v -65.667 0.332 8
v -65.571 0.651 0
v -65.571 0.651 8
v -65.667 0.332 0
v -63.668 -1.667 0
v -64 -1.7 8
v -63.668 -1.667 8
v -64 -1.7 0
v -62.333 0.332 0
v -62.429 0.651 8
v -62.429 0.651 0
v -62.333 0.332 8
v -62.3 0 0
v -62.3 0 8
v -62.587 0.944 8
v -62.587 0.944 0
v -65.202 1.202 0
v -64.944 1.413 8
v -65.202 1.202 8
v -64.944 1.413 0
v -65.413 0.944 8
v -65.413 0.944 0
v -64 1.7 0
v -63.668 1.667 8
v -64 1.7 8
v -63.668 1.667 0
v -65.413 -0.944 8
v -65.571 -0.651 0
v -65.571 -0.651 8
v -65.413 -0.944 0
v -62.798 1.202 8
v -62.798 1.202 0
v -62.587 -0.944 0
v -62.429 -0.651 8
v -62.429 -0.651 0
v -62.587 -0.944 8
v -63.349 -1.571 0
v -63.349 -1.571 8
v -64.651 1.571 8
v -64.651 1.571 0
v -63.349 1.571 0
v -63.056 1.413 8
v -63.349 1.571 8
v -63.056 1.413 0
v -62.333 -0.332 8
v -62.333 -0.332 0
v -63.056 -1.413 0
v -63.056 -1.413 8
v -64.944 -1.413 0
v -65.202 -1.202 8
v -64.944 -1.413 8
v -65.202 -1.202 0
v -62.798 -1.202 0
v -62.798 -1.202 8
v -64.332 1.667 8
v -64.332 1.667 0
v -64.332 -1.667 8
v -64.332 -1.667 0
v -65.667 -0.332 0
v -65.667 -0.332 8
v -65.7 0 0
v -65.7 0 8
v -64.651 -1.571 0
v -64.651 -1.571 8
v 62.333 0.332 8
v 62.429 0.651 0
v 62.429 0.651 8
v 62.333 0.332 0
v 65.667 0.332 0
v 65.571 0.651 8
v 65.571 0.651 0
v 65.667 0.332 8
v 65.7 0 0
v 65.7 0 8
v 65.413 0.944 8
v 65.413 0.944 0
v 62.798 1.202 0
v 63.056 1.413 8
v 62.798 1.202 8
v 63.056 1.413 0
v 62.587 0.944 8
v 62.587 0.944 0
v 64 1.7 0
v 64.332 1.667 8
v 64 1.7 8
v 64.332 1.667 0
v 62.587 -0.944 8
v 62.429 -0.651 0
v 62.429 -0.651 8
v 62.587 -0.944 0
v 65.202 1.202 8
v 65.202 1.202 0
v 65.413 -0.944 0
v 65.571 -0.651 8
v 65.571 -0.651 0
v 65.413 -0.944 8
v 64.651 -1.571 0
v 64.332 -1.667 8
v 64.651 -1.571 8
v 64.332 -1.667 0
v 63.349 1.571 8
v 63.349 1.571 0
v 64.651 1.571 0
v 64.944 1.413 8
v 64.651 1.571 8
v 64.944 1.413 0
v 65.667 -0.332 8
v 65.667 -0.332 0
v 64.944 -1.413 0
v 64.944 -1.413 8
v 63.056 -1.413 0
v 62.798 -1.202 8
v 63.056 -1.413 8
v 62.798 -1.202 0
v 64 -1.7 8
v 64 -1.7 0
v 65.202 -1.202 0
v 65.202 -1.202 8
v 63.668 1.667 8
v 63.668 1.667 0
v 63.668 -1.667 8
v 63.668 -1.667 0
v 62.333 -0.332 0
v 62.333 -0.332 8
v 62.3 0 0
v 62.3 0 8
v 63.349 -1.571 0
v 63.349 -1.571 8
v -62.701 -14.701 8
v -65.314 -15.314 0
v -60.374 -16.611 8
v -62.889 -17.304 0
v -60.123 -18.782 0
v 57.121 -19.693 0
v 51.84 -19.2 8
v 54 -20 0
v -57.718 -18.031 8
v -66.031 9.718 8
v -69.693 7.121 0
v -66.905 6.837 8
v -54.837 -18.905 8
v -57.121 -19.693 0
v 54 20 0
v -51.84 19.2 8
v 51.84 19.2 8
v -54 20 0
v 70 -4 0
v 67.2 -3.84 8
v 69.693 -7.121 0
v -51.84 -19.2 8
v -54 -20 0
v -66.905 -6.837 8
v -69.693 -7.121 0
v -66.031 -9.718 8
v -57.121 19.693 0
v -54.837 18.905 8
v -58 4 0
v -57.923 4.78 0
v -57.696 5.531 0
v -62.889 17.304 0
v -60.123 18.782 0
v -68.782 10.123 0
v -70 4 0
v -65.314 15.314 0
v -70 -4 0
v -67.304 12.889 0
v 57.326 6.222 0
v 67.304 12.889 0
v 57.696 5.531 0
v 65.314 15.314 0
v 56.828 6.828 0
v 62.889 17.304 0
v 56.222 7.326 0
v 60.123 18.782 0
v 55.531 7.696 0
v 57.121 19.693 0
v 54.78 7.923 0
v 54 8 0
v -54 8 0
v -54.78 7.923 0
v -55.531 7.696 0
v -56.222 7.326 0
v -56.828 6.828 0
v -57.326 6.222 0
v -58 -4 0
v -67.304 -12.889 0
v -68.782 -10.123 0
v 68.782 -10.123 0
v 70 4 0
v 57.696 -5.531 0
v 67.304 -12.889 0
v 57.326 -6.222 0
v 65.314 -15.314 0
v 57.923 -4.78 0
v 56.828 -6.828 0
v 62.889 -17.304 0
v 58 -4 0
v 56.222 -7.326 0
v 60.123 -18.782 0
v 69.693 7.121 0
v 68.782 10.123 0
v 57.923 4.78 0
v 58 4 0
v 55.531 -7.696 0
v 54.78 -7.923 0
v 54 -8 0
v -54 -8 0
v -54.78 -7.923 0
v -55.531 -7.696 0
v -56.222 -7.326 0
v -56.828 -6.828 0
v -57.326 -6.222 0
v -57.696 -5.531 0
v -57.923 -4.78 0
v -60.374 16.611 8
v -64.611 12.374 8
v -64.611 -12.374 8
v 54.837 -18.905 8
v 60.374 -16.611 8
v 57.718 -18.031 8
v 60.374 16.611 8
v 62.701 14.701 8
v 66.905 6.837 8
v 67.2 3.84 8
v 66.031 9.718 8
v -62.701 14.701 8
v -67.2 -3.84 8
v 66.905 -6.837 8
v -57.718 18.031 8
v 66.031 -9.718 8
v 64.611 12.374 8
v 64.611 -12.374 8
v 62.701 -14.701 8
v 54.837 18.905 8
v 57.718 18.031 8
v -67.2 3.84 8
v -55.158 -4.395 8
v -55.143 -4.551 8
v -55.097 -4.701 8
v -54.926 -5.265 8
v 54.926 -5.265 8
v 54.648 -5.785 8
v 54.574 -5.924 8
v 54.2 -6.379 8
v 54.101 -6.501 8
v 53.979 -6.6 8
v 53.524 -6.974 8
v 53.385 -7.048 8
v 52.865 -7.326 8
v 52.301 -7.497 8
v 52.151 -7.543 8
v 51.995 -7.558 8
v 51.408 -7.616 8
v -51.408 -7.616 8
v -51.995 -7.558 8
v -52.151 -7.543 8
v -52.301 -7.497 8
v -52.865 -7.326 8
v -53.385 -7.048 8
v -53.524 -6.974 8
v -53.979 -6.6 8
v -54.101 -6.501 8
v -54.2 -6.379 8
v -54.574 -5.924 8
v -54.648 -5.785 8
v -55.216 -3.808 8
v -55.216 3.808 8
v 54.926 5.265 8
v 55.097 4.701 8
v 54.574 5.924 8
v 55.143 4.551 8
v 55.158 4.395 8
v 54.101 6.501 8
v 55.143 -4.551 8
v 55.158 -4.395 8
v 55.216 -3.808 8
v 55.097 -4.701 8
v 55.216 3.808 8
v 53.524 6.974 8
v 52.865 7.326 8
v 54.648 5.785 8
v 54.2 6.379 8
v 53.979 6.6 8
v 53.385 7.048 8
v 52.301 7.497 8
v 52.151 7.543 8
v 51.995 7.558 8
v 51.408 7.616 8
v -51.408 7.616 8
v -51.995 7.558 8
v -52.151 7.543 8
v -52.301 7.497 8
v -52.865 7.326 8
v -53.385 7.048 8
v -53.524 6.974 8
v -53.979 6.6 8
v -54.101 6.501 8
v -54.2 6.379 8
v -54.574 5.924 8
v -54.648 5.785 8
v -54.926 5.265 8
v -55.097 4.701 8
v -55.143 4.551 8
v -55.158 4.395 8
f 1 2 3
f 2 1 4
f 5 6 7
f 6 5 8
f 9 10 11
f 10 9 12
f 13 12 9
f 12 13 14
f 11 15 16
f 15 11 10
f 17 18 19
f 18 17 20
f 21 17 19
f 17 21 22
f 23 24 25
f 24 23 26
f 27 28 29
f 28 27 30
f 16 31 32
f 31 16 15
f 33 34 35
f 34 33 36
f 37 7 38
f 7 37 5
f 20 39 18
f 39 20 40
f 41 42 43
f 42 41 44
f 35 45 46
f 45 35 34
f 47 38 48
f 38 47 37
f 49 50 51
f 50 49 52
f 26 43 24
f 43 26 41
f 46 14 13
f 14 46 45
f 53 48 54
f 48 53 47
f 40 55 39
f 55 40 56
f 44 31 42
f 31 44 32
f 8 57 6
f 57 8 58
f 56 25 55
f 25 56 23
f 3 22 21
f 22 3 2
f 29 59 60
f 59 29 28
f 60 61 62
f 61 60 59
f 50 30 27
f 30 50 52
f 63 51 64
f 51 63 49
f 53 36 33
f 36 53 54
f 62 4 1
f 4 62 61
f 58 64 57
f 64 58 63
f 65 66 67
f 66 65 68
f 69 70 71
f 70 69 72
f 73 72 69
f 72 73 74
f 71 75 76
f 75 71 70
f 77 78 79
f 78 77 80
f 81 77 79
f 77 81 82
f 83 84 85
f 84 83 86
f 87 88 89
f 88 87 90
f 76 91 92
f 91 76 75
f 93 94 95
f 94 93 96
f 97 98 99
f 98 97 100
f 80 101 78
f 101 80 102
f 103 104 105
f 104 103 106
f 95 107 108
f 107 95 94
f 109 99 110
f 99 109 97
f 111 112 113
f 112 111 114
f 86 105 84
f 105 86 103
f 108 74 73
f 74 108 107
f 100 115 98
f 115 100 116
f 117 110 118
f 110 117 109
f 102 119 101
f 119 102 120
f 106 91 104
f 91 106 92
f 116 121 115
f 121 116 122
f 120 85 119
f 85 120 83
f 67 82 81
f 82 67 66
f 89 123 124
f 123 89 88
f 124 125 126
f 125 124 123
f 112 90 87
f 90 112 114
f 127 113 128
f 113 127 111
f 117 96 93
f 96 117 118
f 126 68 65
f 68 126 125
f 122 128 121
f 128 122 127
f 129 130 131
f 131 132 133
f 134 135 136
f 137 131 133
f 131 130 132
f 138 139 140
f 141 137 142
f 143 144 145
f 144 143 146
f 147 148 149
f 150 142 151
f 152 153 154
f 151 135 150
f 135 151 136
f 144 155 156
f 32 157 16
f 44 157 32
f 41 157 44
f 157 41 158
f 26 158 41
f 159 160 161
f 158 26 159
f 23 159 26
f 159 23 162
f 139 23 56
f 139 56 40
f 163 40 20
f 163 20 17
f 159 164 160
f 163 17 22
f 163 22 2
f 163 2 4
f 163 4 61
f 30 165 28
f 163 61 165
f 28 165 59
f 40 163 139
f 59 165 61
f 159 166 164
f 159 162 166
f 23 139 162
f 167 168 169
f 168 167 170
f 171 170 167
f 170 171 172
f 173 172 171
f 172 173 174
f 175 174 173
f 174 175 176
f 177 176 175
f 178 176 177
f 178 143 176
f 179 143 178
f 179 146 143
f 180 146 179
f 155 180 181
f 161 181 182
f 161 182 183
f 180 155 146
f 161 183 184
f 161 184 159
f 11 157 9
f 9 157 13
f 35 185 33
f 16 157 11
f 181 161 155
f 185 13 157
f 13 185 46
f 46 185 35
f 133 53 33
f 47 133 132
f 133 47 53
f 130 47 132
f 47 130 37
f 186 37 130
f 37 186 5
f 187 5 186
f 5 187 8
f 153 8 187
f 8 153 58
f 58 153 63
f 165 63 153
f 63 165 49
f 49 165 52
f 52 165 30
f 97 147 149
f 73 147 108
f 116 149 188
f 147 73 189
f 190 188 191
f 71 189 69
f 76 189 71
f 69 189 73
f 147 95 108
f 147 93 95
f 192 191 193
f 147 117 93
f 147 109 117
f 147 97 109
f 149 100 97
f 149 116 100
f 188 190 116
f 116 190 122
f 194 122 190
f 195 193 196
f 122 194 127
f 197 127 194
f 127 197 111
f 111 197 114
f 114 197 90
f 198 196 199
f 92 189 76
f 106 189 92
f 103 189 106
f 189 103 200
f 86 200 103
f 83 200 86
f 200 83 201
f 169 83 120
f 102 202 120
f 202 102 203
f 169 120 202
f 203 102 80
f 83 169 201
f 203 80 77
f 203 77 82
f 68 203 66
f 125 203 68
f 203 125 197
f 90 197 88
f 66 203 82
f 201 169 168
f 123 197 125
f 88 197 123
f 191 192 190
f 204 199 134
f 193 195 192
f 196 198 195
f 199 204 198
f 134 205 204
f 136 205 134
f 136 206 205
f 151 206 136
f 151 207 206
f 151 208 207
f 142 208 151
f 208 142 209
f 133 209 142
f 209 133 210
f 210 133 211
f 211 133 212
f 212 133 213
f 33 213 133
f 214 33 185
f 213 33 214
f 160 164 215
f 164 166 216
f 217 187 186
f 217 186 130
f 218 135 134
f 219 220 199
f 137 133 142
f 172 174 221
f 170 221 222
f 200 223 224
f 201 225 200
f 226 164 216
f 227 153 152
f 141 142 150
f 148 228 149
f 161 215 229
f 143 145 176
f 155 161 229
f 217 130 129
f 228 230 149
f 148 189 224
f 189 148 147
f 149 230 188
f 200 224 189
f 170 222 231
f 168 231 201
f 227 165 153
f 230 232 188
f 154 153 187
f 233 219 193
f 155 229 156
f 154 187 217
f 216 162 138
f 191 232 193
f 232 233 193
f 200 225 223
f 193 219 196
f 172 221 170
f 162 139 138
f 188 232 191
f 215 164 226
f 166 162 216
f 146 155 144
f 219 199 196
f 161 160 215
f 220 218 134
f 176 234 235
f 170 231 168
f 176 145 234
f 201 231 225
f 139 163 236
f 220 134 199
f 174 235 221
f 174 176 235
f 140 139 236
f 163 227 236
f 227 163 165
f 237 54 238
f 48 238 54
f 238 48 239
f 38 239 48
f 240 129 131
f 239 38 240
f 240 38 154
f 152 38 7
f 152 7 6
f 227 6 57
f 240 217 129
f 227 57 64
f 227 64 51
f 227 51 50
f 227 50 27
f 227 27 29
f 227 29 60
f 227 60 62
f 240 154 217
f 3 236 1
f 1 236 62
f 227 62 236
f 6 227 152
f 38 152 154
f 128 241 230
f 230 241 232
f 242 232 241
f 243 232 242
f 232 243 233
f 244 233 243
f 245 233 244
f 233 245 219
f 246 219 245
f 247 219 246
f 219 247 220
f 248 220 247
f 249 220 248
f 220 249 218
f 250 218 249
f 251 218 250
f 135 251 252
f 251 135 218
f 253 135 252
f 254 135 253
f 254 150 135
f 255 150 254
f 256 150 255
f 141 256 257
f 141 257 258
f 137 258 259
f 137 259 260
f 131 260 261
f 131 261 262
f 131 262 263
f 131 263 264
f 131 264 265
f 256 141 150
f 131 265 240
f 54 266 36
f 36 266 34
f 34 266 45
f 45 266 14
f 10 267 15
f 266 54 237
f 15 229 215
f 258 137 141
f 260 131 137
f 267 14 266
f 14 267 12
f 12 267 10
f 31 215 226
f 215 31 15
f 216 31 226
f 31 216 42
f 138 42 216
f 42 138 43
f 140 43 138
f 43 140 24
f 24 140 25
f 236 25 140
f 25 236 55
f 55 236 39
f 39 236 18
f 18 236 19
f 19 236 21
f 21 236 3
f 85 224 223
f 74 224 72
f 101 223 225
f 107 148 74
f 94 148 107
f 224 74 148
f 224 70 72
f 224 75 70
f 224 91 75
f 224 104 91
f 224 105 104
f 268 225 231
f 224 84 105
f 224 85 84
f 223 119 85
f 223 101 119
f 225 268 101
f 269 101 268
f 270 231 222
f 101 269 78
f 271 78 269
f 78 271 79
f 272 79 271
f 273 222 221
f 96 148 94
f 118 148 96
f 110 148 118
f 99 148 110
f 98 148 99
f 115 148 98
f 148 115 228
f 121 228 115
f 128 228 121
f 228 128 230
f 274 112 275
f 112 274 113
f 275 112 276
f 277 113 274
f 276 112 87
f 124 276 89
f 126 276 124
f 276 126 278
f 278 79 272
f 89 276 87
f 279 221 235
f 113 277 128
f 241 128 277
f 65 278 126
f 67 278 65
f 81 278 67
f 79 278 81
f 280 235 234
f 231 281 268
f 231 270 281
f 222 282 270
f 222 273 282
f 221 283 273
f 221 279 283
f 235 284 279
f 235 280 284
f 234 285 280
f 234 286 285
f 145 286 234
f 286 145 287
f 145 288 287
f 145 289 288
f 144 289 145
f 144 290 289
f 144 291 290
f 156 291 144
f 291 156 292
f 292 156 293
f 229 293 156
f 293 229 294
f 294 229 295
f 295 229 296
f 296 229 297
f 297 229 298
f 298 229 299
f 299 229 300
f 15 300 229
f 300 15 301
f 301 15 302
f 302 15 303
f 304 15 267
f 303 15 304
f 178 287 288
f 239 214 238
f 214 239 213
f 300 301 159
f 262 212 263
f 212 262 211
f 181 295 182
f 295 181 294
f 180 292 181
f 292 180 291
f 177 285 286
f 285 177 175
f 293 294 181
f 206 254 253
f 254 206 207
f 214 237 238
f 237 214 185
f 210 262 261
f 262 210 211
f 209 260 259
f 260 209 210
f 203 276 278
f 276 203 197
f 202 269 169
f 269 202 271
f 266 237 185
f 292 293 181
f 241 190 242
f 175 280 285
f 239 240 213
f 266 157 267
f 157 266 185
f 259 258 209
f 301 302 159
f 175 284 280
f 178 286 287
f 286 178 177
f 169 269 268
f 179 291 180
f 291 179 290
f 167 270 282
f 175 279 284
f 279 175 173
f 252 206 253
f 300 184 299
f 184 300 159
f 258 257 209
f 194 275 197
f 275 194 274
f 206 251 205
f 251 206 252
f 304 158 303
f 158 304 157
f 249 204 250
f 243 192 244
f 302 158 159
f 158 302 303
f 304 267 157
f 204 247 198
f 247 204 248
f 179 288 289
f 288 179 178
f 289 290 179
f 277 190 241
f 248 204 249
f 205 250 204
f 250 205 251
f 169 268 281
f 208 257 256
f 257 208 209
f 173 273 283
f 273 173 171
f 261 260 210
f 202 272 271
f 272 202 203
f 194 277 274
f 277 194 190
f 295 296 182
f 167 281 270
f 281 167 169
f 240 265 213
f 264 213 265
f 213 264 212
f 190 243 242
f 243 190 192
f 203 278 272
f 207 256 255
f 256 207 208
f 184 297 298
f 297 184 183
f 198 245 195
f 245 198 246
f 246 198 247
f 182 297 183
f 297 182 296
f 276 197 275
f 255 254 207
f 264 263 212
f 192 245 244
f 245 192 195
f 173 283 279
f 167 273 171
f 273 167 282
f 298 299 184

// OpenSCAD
$fn = 32;

// ----------------------------------------------------------------------
// Display bezel: 140 x 40 mm frame, opening 116x16 mm
// ----------------------------------------------------------------------

// --- parameters (mm) ---
length = 140;             // frame outside length, X
width = 40;               // frame outside width, Y
frame_w = 12;             // frame width
thickness = 8;            // frame thickness
corner_r = 16;            // outside corner radius
chamfer = 0.96;           // outer wall taper
funnel = 0.94;            // inner opening taper
opening_l = 116;          // opening length
opening_w = 16;           // opening width
inner_r = 4;              // opening corner radius
hole_d = 3.4;             // mounting screw clearance
holes_per_side = 1;       // holes per short side
hole_inset = 6;           // hole centre inset from the outside edge

/* rounded-rectangle outlines, generated with loops */
module rounded_ring(l_nom, w_nom, r) {
  hull() {
    for (sx = [-1, 1]) for (sy = [-1, 1])
      translate([sx * (l_nom / 2 - r), sy * (w_nom / 2 - r)]) circle(r = r);
  }
}

difference() {
  /* frame body, drafted so the outer edge is a variable-depth chamfer */
  linear_extrude(height = thickness, scale = chamfer)
    rounded_ring(length, width, corner_r);
  /* viewing opening, drafted the other way for a funnel edge */
  linear_extrude(height = thickness + 2, scale = funnel)
    translate([0, 0, -1]) rounded_ring(opening_l, opening_w, inner_r);
  /* mounting screws through the frame lands */
  for (sx = [-1, 1]) for (i = [1 : holes_per_side])
    translate([sx * (length / 2 - hole_inset),
               (i - (holes_per_side + 1) / 2) * width * 0.5, -1])
      cylinder(h = thickness + 2, d = hole_d);
}
